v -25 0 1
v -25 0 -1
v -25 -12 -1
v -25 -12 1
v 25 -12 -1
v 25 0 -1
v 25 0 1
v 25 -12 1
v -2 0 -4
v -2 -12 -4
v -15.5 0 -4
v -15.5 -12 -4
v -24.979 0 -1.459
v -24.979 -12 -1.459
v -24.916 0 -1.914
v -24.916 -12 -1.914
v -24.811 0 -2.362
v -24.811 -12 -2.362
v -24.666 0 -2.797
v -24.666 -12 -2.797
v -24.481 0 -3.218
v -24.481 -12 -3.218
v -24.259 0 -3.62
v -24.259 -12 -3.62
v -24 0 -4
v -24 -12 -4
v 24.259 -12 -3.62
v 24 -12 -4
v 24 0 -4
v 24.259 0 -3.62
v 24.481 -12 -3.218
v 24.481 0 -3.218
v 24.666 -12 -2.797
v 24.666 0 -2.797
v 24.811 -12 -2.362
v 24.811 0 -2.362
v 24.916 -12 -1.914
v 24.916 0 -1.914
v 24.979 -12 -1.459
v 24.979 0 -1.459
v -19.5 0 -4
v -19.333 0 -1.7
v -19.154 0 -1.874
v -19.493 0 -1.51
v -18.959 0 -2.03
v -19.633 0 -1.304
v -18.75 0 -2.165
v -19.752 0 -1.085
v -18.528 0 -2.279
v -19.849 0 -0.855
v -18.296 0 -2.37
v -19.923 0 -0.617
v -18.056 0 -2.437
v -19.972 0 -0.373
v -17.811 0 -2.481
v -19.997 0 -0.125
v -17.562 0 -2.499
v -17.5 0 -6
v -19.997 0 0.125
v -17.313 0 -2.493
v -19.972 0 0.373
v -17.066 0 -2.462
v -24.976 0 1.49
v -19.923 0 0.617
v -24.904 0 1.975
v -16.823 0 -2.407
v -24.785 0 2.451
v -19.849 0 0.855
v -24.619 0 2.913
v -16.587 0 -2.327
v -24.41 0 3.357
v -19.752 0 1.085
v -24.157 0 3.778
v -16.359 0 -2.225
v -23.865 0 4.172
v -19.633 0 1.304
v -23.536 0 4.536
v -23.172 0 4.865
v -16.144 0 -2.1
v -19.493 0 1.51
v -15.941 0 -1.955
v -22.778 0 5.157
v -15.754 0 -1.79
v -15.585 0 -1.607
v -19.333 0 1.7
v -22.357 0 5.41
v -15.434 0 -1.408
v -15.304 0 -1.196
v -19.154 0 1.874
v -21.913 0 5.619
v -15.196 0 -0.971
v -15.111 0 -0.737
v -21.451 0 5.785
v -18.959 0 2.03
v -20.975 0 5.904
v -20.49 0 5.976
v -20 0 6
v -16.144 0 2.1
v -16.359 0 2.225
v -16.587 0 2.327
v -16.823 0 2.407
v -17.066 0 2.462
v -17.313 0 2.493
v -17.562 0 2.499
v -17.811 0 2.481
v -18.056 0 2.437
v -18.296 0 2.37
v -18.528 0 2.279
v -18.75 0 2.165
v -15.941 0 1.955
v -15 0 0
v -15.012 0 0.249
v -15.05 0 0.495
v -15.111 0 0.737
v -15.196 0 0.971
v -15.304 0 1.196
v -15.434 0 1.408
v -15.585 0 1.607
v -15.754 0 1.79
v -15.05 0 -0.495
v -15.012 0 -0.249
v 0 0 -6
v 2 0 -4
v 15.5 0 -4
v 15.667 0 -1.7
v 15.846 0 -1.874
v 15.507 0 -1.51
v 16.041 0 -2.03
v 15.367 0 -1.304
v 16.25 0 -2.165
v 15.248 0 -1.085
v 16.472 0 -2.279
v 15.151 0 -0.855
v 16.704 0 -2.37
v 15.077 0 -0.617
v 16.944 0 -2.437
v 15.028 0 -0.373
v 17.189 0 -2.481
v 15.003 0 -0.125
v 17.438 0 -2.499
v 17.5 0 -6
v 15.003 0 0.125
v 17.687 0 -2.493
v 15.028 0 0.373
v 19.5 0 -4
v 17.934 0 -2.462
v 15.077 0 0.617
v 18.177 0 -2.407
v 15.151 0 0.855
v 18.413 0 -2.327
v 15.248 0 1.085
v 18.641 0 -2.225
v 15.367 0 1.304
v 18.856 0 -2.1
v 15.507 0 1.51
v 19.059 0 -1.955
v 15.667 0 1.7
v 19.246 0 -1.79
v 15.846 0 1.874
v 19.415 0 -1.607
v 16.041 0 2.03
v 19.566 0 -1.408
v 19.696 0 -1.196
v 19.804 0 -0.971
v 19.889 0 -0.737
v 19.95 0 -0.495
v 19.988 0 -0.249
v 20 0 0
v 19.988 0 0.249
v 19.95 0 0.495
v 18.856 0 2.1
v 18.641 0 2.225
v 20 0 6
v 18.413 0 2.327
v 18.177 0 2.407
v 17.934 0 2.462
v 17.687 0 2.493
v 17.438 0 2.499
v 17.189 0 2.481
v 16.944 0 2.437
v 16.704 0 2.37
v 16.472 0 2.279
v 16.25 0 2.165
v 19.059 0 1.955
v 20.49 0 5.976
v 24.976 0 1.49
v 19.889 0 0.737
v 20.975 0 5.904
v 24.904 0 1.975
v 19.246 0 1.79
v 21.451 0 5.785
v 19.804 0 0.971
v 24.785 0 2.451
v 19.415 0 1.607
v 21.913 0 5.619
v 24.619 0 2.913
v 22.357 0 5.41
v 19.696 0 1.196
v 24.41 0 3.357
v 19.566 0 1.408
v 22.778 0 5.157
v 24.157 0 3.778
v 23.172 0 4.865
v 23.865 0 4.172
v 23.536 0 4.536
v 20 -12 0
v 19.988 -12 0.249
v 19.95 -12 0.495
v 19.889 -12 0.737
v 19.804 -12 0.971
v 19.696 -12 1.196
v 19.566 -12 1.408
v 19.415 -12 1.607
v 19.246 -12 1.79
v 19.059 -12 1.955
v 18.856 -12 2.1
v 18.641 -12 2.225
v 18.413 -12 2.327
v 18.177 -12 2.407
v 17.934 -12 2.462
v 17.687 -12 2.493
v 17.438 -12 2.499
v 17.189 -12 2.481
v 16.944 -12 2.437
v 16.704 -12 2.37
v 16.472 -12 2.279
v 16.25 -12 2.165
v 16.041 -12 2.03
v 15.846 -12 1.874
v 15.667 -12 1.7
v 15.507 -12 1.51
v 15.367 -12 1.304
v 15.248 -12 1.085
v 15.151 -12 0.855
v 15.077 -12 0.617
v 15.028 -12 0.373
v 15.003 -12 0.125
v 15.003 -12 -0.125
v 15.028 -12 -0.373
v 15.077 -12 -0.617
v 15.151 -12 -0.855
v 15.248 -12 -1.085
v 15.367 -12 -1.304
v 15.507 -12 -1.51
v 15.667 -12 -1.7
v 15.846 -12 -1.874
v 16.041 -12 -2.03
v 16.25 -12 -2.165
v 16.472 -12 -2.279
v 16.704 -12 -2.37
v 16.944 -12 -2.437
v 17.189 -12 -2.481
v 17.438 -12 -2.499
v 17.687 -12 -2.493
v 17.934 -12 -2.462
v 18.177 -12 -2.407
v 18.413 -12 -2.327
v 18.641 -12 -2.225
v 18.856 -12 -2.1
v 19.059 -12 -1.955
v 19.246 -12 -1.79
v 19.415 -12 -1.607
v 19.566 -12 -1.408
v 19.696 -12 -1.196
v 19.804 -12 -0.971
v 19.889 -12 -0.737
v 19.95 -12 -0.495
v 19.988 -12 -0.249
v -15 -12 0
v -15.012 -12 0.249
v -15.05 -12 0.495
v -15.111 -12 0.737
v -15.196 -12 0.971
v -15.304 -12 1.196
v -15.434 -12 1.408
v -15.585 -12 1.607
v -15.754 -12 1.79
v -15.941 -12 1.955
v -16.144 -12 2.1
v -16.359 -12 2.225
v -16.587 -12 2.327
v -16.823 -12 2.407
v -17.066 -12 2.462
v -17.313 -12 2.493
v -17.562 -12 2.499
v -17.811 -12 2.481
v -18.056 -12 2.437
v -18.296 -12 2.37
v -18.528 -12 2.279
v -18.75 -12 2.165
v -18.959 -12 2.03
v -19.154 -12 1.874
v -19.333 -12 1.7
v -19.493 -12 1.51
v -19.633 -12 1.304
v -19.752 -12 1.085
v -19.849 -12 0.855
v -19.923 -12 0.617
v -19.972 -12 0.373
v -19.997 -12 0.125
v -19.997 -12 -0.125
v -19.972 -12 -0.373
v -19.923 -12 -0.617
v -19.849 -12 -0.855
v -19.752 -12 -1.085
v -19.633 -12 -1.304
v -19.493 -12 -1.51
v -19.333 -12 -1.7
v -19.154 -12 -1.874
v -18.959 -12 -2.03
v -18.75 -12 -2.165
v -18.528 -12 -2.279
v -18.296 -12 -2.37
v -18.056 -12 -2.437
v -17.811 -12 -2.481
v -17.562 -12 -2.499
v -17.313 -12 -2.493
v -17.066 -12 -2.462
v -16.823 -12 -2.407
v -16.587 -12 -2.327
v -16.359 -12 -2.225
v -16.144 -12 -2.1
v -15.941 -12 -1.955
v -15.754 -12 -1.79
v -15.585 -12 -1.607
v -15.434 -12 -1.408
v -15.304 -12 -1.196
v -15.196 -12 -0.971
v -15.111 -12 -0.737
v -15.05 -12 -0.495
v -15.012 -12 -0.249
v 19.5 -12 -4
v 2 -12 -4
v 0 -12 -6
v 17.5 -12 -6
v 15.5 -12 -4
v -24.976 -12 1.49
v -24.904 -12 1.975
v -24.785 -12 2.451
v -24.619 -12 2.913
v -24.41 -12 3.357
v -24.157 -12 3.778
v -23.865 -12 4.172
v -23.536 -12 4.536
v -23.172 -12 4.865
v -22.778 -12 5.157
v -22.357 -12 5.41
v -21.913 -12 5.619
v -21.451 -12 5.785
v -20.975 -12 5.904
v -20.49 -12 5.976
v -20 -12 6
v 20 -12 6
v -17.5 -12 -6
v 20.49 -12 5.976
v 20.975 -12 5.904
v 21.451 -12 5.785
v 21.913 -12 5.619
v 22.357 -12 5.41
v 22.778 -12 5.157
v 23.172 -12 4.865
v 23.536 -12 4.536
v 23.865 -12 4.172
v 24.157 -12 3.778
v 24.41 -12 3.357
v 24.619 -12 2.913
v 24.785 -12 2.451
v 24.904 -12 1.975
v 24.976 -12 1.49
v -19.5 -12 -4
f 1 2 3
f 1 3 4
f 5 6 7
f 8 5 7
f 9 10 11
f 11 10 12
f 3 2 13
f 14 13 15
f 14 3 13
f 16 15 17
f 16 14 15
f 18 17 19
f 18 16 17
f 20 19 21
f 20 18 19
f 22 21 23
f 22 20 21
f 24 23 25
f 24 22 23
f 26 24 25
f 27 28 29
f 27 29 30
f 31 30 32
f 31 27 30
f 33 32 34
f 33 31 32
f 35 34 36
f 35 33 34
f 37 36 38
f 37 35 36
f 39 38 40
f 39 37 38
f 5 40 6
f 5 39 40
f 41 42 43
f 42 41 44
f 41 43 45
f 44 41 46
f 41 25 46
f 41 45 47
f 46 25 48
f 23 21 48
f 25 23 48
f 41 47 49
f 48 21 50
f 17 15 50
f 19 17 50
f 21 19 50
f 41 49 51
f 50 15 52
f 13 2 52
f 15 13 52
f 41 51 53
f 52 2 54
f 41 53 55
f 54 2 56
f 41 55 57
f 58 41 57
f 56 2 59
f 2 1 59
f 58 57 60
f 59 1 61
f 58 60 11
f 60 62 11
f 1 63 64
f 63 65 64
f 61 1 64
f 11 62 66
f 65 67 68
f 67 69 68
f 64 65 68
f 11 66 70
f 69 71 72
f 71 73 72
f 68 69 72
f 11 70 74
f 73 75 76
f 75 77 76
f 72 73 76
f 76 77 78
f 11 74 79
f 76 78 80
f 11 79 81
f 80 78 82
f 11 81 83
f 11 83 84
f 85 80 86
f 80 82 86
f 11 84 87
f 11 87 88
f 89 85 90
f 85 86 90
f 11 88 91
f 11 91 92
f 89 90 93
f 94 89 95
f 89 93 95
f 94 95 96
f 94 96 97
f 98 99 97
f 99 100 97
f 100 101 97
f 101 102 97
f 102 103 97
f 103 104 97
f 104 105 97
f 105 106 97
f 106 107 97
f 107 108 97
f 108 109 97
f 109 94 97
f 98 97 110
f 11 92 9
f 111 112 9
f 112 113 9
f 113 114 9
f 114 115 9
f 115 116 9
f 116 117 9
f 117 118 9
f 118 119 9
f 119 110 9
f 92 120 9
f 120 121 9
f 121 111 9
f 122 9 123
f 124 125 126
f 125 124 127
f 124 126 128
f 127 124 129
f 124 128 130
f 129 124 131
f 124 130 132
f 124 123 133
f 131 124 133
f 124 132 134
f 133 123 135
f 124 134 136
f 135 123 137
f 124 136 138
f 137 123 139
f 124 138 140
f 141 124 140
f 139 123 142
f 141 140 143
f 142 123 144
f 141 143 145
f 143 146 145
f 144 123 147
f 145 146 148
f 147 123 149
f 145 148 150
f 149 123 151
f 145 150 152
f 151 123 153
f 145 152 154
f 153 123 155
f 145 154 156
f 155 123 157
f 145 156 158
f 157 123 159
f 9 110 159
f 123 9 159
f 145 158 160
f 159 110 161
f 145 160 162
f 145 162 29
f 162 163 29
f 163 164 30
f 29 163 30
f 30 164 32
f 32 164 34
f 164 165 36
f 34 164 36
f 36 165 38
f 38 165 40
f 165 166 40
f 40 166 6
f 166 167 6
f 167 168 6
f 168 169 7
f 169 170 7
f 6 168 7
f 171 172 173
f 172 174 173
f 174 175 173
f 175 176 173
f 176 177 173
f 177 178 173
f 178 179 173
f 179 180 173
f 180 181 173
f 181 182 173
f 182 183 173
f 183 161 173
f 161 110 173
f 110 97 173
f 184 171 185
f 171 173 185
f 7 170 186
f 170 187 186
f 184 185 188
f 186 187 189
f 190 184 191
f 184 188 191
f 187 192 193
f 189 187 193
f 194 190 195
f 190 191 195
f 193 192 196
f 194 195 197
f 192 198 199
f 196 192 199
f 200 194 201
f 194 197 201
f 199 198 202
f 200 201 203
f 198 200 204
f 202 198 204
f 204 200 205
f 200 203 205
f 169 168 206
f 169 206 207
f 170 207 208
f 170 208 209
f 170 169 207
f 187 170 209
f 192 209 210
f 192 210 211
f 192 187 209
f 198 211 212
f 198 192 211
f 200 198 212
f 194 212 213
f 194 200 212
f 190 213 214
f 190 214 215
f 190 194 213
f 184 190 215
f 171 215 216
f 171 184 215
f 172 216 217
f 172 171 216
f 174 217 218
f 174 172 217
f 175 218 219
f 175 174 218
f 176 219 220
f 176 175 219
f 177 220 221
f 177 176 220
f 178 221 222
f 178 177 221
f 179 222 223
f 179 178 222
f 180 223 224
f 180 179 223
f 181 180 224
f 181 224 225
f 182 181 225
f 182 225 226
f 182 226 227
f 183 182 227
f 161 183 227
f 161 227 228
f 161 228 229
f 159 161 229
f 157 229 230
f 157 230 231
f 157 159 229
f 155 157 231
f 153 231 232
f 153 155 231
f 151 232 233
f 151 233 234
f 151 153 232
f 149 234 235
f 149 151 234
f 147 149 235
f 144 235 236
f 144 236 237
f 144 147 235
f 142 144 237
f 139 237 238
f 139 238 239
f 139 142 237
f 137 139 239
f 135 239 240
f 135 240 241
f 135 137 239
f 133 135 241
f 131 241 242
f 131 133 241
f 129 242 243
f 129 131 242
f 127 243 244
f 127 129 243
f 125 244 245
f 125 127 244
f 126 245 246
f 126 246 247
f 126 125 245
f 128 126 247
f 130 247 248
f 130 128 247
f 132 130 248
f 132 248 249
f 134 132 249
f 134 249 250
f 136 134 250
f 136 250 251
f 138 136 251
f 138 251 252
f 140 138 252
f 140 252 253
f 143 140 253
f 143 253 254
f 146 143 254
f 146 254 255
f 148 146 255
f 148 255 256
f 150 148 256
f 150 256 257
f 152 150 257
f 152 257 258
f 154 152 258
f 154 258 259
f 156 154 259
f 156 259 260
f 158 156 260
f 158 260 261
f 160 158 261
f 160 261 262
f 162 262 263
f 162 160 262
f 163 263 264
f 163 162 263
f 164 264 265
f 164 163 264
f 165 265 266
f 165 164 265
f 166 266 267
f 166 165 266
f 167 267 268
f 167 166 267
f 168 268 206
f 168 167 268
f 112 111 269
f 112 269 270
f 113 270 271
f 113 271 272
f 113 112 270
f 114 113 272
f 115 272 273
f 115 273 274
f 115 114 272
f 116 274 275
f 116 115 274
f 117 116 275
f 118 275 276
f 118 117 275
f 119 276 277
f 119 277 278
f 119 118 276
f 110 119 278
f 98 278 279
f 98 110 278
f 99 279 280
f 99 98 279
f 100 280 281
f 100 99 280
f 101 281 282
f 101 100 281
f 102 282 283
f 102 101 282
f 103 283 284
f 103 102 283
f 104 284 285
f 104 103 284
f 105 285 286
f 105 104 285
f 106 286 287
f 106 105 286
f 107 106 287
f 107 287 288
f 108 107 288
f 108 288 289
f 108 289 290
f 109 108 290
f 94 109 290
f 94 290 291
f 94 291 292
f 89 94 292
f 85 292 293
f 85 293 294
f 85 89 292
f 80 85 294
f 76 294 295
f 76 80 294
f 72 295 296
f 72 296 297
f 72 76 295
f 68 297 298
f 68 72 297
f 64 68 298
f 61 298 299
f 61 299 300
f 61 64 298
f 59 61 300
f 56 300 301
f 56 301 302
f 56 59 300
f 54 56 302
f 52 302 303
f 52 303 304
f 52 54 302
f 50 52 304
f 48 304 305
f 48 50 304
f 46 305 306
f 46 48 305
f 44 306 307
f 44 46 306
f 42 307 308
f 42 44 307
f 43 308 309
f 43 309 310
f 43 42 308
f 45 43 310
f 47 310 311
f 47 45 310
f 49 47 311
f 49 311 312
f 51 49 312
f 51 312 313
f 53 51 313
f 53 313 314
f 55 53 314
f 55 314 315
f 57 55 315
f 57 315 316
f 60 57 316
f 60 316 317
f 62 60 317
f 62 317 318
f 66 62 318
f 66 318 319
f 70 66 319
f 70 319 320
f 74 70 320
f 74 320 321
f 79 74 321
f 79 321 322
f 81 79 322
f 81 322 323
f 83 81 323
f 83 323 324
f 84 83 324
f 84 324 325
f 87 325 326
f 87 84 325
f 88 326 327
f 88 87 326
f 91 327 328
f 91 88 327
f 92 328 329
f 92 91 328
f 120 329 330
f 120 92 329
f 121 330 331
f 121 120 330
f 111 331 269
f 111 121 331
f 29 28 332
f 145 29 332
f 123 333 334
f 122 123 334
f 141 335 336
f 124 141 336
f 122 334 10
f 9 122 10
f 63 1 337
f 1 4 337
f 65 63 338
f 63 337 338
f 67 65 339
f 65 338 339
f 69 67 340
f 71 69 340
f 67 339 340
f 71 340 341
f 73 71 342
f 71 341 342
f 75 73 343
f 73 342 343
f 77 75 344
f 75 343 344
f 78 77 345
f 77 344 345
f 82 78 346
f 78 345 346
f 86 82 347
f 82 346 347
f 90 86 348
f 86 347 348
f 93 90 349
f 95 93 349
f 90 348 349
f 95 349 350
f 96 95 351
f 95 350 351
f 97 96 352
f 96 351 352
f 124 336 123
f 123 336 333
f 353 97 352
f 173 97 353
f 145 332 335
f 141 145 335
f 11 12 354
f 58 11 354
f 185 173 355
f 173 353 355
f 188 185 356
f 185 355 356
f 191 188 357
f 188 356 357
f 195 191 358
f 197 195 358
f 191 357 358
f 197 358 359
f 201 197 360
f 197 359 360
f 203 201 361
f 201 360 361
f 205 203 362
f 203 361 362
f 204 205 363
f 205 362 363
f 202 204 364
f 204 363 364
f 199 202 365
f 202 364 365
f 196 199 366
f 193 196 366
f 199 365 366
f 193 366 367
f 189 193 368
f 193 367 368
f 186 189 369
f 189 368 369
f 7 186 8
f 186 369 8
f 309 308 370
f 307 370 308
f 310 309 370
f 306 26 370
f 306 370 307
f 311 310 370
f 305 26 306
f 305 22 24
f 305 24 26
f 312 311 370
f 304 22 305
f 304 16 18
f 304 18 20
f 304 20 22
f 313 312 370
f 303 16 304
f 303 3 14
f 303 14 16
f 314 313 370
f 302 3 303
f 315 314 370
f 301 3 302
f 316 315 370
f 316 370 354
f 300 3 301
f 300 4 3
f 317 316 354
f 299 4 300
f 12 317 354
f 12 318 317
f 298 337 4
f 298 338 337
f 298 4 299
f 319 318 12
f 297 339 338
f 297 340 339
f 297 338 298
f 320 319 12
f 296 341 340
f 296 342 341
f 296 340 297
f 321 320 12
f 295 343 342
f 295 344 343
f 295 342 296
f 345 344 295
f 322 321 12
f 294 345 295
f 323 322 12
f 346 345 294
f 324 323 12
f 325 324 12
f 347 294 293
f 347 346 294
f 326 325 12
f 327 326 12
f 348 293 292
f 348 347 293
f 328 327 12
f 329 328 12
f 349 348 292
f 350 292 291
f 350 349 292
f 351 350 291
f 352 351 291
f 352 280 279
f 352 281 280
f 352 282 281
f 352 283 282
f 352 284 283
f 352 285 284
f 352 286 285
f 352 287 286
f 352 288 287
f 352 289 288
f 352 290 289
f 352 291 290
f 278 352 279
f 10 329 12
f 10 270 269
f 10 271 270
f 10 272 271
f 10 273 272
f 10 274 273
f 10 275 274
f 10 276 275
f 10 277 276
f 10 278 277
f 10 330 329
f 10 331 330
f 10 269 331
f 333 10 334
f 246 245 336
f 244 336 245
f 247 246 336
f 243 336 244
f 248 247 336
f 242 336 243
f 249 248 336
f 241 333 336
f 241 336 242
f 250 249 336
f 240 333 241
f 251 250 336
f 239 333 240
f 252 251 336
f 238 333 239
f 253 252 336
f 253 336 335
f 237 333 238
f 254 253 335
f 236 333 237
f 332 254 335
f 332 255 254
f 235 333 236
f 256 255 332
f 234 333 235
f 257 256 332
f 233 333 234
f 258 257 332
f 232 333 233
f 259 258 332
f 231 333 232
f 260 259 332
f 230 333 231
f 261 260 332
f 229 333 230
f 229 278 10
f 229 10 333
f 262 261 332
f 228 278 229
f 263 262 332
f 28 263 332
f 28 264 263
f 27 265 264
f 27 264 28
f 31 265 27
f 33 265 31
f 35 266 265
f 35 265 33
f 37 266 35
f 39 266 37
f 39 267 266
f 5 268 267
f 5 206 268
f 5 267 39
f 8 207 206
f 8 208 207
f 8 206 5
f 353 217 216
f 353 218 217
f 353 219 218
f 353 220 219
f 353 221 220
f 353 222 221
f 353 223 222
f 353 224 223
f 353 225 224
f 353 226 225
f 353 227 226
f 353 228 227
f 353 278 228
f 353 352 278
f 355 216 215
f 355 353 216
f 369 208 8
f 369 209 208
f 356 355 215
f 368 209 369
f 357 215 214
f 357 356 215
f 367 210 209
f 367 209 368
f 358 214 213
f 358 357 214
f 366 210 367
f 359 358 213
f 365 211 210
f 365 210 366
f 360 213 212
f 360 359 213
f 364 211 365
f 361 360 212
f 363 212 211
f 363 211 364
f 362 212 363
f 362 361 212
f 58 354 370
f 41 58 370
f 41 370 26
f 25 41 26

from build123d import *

# Parameters (mm, degrees)
F0_W     = 50
F0_H     = 12
F0_R     = 2.5
F1_DEPTH = 12
F2_R     = 5
F4_DEPTH = 25


with BuildPart() as f1:
    # F0 (on Front) → F1 (new body)
    with BuildSketch(Plane.XZ):
        Rectangle(F0_W, F0_H)
        with Locations((-17.5, 0)):
            Circle(F0_R, mode=Mode.SUBTRACT)
        with Locations((17.5, 0)):
            Circle(F0_R, mode=Mode.SUBTRACT)
    extrude(amount=F1_DEPTH)

    # F2
    f2_edges = [f1.edges().sort_by_distance(p)[0] for p in [
        (-25, -6, 6),
        (25, -6, 6),
        (25, -6, -6),
        (-25, -6, -6),
    ]]
    fillet(f2_edges, radius=F2_R)

    # F3 (on face) → F4 (cut)
    with BuildSketch(Plane.XZ.offset(12)):
        Polygon((2, -4), (0, -6), (17.5, -6), (15.5, -4), align=None)
        Polygon((-17.5, -6), (0, -6), (-2, -4), (-15.5, -4), align=None)
        with BuildLine():
            Line((19.5, -4), (17.5, -6))
            Line((17.5, -6), (20, -6))
            ThreePointArc((20, -6), (22.236068, -5.472136), (24, -4))
            Line((24, -4), (19.5, -4))
        make_face()
        with BuildLine():
            Line((-20, -6), (-17.5, -6))
            Line((-17.5, -6), (-19.5, -4))
            Line((-19.5, -4), (-24, -4))
            ThreePointArc((-24, -4), (-22.236068, -5.472136), (-20, -6))
        make_face()
    extrude(amount=-F4_DEPTH, mode=Mode.SUBTRACT)


solid = f1.part
